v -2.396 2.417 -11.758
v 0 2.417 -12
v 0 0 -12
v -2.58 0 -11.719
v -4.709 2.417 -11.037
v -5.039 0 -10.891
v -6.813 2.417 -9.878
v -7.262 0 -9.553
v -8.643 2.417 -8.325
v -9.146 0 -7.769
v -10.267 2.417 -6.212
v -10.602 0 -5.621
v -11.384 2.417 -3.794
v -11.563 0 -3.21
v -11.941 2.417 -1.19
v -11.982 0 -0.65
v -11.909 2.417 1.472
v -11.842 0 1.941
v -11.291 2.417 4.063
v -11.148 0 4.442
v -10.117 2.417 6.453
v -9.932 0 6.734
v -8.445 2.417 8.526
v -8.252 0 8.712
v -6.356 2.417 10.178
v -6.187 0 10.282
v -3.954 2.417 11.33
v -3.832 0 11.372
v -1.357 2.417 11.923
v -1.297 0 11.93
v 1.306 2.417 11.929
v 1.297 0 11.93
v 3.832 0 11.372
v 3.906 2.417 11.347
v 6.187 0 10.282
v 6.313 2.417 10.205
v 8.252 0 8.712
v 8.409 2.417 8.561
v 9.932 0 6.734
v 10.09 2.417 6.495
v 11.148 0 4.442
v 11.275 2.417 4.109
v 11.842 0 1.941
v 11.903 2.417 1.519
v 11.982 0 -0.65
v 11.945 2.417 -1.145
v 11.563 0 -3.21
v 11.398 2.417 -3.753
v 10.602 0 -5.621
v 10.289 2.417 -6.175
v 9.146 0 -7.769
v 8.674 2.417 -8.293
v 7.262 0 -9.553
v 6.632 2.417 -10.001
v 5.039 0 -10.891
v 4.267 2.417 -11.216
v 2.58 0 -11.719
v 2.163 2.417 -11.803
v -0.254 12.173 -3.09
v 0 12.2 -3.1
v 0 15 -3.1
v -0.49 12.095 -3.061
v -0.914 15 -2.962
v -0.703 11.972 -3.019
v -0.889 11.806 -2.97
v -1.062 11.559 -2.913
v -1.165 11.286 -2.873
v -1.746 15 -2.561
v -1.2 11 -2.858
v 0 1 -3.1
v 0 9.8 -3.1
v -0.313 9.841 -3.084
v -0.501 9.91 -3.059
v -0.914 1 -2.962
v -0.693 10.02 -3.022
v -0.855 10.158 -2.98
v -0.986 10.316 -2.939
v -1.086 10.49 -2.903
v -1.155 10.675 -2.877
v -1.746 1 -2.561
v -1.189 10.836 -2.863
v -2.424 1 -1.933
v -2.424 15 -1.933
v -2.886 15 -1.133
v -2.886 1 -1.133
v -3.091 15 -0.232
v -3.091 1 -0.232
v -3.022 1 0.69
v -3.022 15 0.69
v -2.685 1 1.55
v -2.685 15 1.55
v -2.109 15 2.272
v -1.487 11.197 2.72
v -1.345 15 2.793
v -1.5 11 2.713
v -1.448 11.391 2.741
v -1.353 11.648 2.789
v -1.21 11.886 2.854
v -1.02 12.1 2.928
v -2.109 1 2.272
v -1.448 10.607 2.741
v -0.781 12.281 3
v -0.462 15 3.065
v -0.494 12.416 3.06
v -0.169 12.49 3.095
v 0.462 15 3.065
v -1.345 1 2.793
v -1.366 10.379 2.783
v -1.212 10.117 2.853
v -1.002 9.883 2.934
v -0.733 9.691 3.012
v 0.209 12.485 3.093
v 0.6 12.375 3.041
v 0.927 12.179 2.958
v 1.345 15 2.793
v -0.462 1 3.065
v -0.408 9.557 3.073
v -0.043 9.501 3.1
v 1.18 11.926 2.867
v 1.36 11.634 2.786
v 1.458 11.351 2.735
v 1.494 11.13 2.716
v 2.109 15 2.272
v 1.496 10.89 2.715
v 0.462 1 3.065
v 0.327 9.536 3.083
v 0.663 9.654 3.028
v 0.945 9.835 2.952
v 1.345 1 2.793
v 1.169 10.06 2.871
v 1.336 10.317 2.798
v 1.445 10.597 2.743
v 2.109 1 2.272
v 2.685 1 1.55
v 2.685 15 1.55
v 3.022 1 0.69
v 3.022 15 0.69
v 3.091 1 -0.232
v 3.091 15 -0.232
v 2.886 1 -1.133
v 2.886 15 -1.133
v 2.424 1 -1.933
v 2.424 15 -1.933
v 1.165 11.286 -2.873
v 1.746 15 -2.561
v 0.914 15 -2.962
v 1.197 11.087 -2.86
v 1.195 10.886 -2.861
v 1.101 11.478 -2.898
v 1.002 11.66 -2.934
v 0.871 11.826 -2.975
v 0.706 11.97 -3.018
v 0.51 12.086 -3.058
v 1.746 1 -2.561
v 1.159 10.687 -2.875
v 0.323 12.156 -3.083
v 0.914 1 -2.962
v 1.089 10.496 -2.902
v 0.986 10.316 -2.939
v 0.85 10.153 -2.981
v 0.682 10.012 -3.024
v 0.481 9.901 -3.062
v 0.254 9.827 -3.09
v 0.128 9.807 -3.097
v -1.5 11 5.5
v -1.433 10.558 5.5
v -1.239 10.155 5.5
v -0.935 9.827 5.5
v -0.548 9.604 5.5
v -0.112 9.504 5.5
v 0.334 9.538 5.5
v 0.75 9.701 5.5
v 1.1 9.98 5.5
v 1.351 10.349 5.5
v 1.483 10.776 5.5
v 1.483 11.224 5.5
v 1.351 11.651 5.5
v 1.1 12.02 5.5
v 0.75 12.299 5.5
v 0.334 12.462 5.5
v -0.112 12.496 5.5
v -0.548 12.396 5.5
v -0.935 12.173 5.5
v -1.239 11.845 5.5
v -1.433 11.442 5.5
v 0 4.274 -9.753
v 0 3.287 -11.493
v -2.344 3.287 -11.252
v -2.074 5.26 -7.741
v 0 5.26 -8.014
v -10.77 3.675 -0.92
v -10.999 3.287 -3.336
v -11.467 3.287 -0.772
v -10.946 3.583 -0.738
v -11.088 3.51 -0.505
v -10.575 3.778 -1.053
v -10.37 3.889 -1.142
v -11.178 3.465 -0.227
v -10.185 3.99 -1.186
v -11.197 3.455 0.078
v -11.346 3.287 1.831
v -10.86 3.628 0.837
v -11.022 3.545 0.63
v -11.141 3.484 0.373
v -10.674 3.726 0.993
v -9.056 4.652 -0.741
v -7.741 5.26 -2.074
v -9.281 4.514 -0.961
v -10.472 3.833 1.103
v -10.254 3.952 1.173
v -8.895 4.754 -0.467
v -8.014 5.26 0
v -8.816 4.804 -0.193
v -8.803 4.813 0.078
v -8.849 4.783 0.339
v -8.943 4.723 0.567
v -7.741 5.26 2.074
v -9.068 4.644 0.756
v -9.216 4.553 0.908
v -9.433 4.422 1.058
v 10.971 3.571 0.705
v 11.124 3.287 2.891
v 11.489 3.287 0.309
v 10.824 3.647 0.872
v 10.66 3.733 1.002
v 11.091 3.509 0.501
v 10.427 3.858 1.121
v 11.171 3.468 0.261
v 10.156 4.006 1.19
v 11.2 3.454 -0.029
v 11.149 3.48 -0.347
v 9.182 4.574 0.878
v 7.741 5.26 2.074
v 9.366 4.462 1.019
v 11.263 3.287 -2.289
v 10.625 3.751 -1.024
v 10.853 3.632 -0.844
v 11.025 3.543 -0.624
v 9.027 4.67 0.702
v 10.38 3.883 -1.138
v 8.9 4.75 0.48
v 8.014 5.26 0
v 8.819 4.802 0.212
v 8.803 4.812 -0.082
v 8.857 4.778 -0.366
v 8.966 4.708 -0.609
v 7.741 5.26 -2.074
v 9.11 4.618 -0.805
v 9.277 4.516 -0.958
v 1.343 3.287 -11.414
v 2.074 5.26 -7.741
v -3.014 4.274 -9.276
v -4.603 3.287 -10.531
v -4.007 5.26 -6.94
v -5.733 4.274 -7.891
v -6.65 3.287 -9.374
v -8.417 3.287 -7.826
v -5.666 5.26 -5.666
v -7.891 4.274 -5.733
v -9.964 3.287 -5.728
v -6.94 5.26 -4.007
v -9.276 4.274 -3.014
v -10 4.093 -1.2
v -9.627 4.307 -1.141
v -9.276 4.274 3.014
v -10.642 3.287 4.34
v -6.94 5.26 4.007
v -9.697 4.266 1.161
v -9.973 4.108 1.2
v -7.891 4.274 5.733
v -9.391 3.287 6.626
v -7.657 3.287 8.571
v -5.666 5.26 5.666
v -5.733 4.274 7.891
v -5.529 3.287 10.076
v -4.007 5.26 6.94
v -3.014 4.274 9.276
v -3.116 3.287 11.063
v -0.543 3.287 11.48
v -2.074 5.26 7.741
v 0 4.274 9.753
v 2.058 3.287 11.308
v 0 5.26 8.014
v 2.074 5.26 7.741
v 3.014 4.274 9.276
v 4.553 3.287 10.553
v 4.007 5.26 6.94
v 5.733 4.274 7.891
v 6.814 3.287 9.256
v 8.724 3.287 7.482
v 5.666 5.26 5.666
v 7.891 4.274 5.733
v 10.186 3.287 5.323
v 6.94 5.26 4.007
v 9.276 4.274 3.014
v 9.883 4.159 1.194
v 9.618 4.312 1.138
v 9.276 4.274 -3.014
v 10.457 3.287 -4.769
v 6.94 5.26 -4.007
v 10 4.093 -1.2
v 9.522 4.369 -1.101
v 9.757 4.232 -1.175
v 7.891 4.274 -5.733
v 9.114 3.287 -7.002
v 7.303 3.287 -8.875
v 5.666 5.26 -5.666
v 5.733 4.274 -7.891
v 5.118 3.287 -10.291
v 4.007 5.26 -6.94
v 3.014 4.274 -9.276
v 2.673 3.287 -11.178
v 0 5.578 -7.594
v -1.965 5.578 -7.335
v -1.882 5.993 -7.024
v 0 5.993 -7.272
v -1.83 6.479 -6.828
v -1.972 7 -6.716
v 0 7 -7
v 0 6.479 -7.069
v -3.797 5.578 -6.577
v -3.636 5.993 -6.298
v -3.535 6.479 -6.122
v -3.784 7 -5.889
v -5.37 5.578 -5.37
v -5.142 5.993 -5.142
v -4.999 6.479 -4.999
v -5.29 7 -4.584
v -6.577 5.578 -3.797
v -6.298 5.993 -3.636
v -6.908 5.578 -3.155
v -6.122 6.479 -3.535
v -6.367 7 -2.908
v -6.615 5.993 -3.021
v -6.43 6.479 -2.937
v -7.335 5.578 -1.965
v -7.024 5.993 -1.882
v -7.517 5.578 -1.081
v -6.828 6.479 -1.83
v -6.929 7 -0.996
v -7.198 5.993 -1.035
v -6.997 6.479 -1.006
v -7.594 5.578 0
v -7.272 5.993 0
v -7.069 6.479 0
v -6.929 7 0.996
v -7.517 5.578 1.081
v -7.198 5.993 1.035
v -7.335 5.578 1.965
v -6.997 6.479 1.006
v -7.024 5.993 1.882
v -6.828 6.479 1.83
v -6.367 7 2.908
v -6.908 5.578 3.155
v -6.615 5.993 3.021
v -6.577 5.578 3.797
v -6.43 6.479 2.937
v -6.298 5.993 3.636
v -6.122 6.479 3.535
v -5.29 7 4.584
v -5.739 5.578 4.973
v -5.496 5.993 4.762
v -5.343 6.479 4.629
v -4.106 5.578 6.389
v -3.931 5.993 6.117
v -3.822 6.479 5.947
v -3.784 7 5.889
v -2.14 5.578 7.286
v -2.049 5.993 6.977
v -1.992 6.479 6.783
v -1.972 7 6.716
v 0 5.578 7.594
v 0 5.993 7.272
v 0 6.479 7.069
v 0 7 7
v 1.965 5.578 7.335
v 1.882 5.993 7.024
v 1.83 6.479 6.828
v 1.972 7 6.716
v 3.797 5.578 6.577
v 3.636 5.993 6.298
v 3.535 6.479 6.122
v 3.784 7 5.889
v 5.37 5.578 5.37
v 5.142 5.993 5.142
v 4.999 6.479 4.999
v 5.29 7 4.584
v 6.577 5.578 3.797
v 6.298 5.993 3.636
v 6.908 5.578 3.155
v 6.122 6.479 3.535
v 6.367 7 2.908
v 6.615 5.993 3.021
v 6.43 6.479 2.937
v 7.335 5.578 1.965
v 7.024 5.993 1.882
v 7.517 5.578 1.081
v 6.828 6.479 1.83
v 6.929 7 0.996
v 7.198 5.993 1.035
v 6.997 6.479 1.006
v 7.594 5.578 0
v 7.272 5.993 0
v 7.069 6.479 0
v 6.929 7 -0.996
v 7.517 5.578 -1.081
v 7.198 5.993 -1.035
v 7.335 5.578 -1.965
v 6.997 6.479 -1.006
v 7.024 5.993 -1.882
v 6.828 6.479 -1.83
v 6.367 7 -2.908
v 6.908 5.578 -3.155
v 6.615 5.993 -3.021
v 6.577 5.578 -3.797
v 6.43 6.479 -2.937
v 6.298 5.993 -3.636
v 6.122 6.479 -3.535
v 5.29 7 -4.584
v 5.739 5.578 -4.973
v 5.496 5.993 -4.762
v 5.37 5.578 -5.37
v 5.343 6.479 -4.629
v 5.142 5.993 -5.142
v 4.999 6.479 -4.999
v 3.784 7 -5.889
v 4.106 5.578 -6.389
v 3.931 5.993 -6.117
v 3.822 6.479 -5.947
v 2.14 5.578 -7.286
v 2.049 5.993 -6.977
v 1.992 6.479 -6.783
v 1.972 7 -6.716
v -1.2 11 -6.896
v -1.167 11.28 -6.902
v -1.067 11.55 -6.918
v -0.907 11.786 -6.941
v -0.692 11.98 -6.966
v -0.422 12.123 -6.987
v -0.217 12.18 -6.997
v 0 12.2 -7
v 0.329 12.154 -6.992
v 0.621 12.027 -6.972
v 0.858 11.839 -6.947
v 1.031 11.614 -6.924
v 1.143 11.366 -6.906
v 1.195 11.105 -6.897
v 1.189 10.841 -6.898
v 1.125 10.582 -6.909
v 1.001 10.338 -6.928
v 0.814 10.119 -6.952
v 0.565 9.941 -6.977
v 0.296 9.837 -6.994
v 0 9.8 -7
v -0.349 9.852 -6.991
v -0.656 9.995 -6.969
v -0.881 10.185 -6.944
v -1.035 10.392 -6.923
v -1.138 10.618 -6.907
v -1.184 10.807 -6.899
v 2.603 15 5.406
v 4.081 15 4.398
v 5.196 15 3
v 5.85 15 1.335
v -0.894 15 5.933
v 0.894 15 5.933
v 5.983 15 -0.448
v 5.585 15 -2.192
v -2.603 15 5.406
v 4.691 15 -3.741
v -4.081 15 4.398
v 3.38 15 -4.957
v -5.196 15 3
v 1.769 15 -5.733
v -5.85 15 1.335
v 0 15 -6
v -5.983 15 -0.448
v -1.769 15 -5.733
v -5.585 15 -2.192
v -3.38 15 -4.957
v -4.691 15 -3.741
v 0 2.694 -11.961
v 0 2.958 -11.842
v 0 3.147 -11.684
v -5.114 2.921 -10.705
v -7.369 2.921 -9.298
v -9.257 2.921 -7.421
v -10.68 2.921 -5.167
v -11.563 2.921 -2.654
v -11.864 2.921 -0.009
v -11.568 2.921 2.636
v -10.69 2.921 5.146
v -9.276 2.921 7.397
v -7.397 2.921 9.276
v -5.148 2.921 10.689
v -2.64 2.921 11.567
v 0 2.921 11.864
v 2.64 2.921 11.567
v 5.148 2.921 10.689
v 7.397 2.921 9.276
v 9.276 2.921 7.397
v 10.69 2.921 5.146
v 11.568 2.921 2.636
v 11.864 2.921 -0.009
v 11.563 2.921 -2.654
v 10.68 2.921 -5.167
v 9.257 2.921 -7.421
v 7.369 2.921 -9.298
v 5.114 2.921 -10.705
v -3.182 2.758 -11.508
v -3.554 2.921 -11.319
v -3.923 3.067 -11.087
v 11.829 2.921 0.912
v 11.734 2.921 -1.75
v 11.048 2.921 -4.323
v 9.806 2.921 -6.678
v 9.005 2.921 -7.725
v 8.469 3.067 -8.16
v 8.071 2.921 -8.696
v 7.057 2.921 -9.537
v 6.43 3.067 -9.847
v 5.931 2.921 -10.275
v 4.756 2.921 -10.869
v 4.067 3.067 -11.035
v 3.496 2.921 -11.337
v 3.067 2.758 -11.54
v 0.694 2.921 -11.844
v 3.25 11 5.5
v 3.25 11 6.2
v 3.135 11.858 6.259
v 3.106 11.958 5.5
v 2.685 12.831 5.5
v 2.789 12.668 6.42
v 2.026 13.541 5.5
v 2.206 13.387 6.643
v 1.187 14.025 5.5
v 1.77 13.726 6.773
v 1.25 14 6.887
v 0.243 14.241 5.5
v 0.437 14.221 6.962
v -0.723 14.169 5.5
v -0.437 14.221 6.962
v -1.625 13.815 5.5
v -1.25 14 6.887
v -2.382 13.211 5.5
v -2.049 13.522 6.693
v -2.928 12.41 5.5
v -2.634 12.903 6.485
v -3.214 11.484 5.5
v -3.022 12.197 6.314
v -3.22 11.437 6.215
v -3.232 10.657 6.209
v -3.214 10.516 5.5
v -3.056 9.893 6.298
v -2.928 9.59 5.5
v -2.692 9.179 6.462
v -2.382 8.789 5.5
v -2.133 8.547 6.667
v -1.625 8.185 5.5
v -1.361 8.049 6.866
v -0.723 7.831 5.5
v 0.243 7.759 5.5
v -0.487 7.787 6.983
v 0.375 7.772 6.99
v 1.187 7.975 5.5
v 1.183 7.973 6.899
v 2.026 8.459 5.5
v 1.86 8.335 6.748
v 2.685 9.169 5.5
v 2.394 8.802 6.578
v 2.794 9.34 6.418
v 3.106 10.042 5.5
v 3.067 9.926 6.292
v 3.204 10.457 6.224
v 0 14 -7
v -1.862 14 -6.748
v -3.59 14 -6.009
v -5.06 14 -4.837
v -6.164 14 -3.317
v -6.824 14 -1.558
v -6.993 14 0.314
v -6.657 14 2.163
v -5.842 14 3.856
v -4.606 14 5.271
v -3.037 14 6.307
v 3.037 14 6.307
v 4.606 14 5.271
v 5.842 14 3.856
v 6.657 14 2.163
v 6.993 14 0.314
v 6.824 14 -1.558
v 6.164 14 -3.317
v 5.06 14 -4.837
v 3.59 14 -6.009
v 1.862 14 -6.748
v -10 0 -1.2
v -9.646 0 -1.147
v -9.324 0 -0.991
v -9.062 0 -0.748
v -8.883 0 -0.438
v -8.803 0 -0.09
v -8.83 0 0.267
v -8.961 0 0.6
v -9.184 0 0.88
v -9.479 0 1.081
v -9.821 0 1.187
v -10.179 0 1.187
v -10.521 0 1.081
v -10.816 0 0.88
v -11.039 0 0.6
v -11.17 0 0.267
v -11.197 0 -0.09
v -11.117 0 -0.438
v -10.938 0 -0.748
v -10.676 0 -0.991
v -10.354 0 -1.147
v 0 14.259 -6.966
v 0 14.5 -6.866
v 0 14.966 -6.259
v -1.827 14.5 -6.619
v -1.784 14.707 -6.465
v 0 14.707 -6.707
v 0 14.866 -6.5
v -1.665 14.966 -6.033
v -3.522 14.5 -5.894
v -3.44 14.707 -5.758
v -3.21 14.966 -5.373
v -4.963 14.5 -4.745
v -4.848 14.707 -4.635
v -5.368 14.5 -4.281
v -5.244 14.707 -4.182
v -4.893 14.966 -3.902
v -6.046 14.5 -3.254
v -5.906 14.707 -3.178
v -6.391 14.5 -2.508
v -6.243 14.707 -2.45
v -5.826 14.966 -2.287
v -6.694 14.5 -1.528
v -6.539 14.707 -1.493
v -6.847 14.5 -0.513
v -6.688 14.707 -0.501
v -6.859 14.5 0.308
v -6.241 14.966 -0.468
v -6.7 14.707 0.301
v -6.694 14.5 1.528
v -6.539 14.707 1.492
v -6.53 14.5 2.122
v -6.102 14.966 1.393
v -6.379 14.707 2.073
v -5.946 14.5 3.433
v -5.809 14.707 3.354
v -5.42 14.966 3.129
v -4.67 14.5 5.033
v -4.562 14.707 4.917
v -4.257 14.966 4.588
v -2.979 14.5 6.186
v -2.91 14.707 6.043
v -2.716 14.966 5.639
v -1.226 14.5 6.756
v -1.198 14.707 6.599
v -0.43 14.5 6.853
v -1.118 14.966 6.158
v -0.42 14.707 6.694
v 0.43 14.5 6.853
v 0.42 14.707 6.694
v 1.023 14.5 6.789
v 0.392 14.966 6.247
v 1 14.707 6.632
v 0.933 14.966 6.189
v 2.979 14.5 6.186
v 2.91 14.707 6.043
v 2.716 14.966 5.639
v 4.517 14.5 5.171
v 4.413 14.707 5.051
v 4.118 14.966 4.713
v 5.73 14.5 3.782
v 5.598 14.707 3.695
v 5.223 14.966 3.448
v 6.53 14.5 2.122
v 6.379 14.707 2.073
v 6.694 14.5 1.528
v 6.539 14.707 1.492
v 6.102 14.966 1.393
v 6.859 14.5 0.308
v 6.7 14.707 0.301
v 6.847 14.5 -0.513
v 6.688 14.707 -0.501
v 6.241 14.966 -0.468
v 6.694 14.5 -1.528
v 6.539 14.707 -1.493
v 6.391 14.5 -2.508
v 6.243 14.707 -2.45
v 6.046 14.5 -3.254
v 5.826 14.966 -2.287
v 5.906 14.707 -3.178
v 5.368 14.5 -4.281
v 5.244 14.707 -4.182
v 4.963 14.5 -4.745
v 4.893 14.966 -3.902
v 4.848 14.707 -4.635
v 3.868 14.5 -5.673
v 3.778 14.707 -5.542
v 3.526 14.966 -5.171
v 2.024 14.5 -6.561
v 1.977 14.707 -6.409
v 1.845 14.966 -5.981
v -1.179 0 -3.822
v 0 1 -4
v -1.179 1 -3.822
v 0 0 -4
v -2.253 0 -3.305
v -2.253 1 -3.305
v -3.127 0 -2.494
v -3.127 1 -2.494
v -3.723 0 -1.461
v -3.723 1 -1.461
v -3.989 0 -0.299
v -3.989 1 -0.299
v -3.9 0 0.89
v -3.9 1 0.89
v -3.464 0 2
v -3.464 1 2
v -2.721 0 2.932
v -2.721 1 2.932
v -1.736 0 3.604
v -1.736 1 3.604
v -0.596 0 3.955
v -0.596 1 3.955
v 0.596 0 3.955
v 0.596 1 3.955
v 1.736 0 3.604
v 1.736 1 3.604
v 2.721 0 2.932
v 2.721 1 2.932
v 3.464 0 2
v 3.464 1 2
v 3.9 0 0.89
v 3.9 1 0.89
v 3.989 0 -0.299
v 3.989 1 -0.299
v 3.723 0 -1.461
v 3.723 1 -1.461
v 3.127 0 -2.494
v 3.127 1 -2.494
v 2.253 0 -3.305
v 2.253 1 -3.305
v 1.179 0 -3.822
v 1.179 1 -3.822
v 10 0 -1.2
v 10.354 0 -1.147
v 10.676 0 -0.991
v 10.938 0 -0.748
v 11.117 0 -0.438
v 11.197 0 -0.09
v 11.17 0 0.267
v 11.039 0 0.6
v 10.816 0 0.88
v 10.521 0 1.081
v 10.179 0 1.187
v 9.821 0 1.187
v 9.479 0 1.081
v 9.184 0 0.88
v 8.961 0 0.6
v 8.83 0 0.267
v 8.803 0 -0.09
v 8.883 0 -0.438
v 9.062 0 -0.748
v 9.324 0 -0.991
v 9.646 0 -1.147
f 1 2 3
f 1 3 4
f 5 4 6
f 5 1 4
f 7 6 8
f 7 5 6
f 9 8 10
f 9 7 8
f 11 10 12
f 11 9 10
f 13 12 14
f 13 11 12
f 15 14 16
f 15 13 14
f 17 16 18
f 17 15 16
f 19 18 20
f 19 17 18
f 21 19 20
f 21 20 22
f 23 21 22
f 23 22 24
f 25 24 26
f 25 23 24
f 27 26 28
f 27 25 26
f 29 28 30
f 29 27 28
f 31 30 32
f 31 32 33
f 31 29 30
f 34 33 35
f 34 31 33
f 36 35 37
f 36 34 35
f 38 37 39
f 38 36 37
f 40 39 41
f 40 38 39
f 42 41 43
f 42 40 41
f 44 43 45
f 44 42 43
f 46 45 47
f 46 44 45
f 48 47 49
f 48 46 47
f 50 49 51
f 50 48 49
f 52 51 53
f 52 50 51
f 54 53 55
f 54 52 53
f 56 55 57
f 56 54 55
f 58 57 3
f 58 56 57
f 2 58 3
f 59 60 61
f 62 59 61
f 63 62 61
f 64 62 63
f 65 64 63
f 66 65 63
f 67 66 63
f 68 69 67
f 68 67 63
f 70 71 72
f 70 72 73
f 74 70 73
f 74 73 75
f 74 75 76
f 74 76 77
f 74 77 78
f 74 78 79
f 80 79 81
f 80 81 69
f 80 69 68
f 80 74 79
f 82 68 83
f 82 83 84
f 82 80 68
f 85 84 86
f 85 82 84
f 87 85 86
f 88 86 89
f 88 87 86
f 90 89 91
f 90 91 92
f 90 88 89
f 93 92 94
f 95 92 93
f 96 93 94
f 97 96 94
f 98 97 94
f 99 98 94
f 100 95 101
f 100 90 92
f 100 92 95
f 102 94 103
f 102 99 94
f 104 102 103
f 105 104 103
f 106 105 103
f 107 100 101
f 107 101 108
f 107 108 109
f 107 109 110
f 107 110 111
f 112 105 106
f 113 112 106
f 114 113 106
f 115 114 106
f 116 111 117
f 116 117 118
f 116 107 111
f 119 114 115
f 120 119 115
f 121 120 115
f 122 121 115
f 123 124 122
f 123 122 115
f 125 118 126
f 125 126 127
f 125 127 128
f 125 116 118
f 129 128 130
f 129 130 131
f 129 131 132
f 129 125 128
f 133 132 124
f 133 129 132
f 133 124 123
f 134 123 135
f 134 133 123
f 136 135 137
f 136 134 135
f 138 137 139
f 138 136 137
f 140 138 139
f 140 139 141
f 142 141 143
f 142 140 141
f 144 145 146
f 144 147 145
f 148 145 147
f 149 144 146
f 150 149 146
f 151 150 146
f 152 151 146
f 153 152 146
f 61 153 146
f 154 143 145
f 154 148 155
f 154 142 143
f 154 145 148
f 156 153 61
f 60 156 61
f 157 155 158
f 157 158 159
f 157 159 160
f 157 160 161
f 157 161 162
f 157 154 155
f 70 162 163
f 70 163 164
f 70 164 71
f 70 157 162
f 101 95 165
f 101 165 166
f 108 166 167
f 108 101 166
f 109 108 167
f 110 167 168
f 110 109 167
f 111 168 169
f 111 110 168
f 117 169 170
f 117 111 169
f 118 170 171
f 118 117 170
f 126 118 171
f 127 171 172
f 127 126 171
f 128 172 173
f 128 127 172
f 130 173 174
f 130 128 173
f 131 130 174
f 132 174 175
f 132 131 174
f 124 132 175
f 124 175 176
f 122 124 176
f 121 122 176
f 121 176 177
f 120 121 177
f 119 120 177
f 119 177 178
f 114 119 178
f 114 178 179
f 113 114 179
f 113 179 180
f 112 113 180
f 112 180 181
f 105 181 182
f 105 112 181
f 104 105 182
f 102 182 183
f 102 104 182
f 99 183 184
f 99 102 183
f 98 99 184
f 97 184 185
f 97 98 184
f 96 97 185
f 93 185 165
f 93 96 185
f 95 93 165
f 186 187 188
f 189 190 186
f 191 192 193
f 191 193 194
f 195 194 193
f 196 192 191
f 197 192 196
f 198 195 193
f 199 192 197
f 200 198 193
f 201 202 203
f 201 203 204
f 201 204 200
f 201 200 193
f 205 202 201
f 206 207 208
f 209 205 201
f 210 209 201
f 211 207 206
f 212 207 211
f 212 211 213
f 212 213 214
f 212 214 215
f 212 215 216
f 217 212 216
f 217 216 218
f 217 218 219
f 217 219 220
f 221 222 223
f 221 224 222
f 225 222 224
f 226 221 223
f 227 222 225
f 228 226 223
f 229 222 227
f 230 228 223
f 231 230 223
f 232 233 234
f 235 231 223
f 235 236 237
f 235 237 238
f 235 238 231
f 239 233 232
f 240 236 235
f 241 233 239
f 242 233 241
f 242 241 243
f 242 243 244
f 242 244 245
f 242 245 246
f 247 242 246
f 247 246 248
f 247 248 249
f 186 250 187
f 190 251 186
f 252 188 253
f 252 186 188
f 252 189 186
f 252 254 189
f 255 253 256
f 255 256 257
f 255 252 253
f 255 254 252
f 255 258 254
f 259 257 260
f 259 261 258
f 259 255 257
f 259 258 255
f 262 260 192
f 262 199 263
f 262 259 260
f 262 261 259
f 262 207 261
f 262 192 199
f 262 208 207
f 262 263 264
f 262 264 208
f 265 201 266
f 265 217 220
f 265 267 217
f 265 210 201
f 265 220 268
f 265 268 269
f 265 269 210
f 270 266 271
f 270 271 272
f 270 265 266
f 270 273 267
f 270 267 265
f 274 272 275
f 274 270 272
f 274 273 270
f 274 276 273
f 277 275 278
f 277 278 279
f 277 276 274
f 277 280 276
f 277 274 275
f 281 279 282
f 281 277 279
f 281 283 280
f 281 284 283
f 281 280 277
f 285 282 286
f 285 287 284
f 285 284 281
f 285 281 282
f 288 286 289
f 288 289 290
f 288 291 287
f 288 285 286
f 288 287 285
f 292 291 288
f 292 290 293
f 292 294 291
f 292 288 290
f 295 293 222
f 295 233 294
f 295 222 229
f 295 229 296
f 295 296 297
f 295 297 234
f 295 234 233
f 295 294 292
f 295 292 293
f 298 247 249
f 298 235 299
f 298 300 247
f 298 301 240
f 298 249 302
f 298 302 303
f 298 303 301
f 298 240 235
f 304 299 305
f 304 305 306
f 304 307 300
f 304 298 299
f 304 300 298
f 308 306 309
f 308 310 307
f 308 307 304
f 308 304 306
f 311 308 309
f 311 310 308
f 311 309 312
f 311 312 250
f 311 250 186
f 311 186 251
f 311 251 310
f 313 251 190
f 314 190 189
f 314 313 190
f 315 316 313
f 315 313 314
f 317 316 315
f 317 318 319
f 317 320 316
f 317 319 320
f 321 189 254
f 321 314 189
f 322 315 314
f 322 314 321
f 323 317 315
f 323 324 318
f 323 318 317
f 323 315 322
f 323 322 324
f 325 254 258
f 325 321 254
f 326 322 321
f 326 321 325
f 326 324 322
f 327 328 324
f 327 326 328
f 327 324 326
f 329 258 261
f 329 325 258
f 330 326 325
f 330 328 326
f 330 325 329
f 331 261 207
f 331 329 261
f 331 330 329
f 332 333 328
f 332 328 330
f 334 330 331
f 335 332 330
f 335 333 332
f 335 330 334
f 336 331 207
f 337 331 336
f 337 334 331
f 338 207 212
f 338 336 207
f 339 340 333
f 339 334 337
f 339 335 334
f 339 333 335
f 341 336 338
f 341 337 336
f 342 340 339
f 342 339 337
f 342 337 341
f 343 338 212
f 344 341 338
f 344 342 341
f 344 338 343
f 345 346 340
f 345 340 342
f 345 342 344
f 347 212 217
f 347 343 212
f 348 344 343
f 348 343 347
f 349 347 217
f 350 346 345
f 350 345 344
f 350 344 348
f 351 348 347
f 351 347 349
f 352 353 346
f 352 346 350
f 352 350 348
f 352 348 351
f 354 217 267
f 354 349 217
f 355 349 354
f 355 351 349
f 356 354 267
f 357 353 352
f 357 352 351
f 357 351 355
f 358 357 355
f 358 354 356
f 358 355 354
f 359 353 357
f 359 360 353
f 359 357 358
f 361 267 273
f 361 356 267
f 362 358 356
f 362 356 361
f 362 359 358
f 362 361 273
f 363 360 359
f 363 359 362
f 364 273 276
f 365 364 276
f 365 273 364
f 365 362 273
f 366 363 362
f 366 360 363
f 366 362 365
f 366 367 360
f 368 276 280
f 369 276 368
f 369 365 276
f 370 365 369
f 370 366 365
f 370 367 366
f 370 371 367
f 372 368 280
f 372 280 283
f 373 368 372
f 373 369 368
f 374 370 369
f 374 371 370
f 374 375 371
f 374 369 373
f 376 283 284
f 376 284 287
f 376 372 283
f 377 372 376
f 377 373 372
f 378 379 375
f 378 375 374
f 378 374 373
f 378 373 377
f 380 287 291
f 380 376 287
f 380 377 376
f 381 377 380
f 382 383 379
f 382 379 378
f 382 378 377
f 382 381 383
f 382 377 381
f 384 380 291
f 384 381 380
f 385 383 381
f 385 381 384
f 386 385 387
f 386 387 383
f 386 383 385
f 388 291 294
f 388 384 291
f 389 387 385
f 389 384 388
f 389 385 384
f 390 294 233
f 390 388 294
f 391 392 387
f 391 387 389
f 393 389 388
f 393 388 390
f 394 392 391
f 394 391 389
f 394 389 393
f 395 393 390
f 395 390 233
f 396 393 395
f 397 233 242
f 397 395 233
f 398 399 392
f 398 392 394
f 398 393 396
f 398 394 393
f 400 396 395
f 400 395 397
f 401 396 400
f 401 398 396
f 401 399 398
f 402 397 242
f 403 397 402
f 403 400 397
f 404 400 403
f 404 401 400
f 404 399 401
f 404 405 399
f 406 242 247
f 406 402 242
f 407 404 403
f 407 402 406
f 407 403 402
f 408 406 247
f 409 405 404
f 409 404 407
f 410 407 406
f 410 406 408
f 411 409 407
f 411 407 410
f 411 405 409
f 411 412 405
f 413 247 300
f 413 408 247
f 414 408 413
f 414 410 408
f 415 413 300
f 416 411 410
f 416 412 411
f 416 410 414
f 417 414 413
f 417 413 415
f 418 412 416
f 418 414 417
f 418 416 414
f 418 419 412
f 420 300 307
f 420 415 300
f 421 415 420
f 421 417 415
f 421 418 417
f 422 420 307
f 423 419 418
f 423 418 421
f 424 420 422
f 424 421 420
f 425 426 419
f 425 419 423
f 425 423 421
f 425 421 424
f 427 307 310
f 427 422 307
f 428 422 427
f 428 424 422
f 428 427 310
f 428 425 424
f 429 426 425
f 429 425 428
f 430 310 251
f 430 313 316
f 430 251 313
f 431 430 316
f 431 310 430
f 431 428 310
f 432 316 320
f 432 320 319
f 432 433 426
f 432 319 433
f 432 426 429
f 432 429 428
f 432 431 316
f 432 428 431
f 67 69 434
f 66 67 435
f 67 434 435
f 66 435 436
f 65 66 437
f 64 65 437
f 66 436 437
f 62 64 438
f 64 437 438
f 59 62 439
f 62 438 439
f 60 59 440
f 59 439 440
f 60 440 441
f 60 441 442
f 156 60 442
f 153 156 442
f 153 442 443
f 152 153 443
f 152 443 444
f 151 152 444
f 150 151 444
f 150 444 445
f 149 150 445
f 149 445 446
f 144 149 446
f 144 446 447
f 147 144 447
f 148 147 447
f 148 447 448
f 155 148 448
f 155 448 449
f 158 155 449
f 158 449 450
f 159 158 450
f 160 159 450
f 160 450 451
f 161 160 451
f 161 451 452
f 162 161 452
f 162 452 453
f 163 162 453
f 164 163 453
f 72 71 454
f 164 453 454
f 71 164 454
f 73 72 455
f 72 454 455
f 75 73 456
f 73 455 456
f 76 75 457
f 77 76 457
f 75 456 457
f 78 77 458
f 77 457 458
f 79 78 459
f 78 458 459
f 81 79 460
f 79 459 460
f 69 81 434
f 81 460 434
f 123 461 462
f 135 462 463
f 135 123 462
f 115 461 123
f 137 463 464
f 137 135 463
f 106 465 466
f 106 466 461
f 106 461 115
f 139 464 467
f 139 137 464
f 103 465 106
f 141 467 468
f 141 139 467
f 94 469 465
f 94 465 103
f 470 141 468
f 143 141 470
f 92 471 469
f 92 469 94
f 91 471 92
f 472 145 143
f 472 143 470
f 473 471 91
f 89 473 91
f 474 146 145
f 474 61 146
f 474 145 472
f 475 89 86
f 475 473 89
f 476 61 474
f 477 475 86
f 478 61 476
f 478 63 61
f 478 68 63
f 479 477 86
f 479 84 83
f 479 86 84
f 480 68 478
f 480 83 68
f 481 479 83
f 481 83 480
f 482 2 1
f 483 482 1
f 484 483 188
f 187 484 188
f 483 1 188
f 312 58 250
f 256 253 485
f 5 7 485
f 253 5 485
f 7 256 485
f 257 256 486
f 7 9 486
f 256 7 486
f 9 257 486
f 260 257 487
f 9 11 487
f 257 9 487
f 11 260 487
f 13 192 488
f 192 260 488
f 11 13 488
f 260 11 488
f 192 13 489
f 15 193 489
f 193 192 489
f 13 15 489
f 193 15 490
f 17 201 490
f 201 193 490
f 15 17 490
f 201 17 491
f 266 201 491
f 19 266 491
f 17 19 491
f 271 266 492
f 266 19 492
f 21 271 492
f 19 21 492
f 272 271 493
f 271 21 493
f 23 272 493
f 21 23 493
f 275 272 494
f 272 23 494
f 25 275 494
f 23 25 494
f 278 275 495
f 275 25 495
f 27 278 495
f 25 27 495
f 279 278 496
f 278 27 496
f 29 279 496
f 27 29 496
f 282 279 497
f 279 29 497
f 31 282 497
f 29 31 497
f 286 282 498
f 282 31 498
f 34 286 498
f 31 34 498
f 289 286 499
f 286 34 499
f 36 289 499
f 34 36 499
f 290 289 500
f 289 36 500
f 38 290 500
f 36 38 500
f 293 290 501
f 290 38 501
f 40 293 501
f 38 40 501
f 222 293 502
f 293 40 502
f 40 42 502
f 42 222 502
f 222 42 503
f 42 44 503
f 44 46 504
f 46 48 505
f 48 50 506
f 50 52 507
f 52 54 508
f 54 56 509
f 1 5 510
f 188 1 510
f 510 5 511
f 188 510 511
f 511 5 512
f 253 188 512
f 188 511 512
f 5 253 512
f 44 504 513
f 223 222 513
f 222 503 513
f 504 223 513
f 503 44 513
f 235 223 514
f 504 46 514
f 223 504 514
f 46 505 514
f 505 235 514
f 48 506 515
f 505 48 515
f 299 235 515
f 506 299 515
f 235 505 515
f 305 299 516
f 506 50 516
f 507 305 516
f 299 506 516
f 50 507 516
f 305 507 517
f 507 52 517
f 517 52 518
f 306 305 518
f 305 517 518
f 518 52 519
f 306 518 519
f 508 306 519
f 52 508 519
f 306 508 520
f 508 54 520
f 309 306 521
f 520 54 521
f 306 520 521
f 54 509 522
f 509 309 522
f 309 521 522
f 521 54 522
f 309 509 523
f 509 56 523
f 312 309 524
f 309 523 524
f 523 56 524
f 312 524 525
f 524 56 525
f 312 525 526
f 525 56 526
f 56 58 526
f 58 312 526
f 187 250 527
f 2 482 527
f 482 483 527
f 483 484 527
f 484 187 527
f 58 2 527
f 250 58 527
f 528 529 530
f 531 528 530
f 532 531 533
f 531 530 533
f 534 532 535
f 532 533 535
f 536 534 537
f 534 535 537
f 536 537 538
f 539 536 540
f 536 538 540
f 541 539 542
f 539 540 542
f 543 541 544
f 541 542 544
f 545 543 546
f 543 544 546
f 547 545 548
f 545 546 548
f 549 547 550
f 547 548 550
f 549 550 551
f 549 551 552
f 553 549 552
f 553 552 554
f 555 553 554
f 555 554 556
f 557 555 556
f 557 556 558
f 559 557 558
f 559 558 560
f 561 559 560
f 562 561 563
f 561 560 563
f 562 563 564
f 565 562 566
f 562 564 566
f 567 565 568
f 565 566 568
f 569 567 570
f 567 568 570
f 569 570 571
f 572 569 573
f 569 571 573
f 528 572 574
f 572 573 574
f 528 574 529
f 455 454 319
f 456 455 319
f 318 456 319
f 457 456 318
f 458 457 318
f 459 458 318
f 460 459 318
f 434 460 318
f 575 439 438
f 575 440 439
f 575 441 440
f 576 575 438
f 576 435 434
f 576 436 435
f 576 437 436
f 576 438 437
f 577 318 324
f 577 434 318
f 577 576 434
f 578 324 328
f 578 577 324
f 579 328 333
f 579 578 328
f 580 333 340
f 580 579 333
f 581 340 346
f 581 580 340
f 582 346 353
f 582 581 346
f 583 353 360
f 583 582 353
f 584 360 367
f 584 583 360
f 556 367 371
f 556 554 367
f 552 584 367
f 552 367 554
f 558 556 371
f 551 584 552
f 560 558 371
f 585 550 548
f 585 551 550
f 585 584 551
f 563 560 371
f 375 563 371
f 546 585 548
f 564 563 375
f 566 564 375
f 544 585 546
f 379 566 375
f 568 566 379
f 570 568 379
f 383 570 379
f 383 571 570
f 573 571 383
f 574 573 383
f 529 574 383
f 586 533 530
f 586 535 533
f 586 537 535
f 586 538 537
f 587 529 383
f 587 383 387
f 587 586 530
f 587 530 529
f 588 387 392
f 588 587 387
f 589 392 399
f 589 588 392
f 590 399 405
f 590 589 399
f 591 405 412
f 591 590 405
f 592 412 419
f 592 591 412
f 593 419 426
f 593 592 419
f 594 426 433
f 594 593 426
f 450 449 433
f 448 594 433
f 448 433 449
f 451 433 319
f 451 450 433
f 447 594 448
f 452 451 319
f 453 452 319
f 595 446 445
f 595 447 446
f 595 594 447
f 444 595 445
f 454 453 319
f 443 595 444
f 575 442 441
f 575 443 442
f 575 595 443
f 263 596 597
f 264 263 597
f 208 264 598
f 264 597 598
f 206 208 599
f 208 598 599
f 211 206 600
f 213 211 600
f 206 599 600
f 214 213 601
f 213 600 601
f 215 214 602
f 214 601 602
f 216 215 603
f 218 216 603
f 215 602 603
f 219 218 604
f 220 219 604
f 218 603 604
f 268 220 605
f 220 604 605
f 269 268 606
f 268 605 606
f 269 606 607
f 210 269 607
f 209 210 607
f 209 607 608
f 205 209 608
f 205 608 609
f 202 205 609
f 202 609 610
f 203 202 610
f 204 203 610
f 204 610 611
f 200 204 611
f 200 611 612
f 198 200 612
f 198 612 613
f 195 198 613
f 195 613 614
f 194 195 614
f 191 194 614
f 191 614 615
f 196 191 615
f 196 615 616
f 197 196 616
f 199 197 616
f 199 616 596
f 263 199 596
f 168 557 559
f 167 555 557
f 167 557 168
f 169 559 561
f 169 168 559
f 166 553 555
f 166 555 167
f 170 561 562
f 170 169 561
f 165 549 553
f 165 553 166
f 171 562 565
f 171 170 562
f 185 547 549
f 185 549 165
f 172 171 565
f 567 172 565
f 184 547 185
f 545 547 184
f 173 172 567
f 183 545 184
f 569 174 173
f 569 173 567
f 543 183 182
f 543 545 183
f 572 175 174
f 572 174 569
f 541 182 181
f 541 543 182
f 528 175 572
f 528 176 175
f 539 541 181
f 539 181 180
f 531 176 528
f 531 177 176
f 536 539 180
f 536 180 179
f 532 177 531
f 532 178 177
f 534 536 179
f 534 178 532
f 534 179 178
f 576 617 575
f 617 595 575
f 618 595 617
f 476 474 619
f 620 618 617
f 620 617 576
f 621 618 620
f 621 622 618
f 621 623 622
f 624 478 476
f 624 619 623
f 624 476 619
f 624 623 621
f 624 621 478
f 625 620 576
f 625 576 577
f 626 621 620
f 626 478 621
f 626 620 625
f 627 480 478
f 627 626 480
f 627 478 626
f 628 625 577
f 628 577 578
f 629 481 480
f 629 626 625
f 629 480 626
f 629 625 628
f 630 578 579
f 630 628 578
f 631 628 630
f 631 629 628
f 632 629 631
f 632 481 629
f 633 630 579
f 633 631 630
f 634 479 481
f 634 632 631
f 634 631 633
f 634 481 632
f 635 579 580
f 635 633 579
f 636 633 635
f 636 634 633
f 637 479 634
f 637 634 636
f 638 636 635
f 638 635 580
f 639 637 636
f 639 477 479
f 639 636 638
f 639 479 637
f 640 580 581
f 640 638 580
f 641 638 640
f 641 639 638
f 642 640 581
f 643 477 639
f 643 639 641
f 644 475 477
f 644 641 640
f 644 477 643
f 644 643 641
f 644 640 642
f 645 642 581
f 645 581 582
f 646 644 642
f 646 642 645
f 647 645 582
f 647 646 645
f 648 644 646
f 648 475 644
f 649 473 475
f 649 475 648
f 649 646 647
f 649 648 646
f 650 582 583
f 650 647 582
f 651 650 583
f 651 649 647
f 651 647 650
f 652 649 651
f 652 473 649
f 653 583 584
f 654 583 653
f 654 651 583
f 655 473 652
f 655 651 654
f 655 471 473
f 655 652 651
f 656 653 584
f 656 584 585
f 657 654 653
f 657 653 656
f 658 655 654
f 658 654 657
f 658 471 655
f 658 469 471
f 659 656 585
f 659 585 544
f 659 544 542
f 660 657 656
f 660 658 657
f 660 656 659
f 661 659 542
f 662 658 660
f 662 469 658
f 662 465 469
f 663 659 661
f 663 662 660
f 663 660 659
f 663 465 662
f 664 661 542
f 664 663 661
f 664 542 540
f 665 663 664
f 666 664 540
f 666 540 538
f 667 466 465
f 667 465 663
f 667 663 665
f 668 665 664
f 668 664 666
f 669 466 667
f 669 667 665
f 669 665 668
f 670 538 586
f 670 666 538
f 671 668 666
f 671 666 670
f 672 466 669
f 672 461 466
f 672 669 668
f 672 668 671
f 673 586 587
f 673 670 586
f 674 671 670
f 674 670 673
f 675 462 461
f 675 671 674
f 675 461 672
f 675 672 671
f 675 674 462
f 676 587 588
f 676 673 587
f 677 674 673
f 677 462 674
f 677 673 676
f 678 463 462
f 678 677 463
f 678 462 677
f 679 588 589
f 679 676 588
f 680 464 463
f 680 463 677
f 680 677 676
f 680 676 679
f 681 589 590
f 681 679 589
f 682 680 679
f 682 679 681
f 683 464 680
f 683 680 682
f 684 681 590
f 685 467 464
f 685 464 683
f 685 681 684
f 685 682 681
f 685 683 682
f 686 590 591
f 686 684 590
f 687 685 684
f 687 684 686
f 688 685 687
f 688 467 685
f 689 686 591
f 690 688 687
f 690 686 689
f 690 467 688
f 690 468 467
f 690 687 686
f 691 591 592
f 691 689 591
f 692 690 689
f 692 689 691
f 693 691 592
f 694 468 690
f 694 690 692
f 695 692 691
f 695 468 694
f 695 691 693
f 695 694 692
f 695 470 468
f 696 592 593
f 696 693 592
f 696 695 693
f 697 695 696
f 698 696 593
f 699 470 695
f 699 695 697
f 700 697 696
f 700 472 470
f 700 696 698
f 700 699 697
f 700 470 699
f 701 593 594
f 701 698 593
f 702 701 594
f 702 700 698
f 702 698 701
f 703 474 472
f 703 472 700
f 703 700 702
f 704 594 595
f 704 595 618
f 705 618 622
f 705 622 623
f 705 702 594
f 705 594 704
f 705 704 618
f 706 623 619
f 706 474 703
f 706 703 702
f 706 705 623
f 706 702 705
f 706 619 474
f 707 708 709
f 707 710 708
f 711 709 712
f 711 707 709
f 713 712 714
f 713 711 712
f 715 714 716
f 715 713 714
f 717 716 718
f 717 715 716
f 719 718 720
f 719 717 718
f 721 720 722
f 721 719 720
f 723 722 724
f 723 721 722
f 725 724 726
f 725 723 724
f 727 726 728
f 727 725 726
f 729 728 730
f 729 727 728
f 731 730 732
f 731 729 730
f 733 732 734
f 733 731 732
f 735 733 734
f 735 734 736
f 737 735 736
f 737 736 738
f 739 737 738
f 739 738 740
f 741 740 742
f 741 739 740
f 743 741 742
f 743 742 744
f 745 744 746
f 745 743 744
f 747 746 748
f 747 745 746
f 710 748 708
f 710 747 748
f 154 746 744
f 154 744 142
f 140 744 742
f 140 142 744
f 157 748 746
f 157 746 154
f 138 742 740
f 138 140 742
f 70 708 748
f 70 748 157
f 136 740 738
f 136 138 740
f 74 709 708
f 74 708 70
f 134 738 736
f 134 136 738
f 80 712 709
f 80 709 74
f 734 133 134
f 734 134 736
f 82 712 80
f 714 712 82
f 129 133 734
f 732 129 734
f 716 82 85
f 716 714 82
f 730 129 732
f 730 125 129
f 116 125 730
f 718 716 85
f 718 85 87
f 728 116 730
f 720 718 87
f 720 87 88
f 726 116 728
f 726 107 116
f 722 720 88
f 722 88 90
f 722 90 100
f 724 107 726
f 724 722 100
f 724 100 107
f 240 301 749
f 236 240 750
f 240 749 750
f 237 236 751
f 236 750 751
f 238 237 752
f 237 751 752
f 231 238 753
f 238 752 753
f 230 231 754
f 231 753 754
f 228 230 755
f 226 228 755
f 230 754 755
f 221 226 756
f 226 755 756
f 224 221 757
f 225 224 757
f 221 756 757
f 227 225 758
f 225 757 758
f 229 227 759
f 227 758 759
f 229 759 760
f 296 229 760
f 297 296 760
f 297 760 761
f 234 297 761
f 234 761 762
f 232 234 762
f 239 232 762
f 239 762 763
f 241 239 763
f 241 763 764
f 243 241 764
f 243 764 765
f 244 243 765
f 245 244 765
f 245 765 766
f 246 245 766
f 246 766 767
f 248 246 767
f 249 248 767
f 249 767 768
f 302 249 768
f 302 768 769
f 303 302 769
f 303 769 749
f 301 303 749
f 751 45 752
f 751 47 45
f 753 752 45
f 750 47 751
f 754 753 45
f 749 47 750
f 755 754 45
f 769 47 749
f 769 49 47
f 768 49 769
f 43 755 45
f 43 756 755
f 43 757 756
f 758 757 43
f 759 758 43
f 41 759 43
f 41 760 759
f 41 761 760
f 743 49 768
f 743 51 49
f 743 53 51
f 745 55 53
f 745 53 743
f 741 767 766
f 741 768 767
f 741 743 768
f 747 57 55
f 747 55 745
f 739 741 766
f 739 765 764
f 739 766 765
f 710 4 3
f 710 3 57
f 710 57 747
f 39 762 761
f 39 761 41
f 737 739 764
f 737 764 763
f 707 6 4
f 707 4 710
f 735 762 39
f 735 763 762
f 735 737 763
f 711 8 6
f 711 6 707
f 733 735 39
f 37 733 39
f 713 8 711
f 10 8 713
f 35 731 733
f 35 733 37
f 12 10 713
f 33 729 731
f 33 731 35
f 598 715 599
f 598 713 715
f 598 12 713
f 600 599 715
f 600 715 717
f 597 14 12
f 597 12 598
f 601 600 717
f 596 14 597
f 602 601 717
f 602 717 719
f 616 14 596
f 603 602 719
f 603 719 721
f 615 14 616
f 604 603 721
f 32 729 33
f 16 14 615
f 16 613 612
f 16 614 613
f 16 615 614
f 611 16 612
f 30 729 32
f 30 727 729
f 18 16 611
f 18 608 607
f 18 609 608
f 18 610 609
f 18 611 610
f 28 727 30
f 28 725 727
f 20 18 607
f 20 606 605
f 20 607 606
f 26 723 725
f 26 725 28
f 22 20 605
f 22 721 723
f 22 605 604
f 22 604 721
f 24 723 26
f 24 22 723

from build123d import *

# Parameters (mm, degrees)
CONG_1_R                                        = 1
ESQUISSE2_R                                     = 1.2
ENL_V_MAT_EXTRU_1_DEPTH                         = 23.649503412
CHAMBRAGE_POUR_VIS_T_TE_CYLINDRIQUE_D           = 2.4
CHAMBRAGE_POUR_VIS_T_TE_CYLINDRIQUE_CBORE_D     = 6.5
CHAMBRAGE_POUR_VIS_T_TE_CYLINDRIQUE_CBORE_DEPTH = 1.5
ESQUISSE3_R                                     = 1.5
ENL_V_MAT_EXTRU_2_DEPTH                         = 23.649503478


with BuildPart() as part:
    # Esquisse1 → Révolution1 (revolve)
    with BuildSketch(Plane.XY, mode=Mode.PRIVATE) as r_volution1_sk:
        with BuildLine():
            Line((3.1, 15), (3.1, 1))
            Line((3.1, 1), (4, 1))
            Line((4, 1), (4, 0))
            Line((4, 0), (12, 0))
            Line((12, 0), (12, 3))
            Line((12, 3), (8.013575778, 5.260181833))
            ThreePointArc((8.013575778, 5.260181833), (7.271872626, 5.993234994), (7, 7))
            Line((7, 7), (7, 15))
            Line((7, 15), (3.1, 15))
        make_face()
    revolve(r_volution1_sk.sketch.rotate(Axis((0, 0, 0), (0, 1, 0)), 90), axis=Axis((0, 0, 0), (0, 1, 0)))

    # Congé1
    cong_1_edges = [part.edges().sort_by_distance(p)[0] for p in [
        (0, 15, 7),
        (0, 3, 12),
    ]]
    fillet(cong_1_edges, radius=CONG_1_R)

    # Esquisse2 → Enlèv. mat.-Extru.1 (cut, through all)
    with BuildSketch(Plane.XZ):
        with Locations(Location((-10, 0, 0), (0, 0, 270))):
            Circle(ESQUISSE2_R)
        with Locations(Location((10, 0, 0), (0, 0, 270))):
            Circle(ESQUISSE2_R)
    extrude(amount=-ENL_V_MAT_EXTRU_1_DEPTH, mode=Mode.SUBTRACT)

    # Chambrage pour vis à tête cylindrique à 6 pans creux (ou vis CHC) M31 (through all)
    with Locations(Plane(origin=(0, 11, 7), x_dir=(1, 0, 0), z_dir=(0, 0, 1))):
        with Locations((0, 0)):
            CounterBoreHole(CHAMBRAGE_POUR_VIS_T_TE_CYLINDRIQUE_D / 2, CHAMBRAGE_POUR_VIS_T_TE_CYLINDRIQUE_CBORE_D / 2, CHAMBRAGE_POUR_VIS_T_TE_CYLINDRIQUE_CBORE_DEPTH)

    # Esquisse3 → Enlèv. mat.-Extru.2 (cut, through all)
    with BuildSketch(Plane.XY):
        with Locations(Location((0, 11, 0), (0, 0, 180))):
            Circle(ESQUISSE3_R)
    extrude(amount=ENL_V_MAT_EXTRU_2_DEPTH, mode=Mode.SUBTRACT)


solid = part.part
